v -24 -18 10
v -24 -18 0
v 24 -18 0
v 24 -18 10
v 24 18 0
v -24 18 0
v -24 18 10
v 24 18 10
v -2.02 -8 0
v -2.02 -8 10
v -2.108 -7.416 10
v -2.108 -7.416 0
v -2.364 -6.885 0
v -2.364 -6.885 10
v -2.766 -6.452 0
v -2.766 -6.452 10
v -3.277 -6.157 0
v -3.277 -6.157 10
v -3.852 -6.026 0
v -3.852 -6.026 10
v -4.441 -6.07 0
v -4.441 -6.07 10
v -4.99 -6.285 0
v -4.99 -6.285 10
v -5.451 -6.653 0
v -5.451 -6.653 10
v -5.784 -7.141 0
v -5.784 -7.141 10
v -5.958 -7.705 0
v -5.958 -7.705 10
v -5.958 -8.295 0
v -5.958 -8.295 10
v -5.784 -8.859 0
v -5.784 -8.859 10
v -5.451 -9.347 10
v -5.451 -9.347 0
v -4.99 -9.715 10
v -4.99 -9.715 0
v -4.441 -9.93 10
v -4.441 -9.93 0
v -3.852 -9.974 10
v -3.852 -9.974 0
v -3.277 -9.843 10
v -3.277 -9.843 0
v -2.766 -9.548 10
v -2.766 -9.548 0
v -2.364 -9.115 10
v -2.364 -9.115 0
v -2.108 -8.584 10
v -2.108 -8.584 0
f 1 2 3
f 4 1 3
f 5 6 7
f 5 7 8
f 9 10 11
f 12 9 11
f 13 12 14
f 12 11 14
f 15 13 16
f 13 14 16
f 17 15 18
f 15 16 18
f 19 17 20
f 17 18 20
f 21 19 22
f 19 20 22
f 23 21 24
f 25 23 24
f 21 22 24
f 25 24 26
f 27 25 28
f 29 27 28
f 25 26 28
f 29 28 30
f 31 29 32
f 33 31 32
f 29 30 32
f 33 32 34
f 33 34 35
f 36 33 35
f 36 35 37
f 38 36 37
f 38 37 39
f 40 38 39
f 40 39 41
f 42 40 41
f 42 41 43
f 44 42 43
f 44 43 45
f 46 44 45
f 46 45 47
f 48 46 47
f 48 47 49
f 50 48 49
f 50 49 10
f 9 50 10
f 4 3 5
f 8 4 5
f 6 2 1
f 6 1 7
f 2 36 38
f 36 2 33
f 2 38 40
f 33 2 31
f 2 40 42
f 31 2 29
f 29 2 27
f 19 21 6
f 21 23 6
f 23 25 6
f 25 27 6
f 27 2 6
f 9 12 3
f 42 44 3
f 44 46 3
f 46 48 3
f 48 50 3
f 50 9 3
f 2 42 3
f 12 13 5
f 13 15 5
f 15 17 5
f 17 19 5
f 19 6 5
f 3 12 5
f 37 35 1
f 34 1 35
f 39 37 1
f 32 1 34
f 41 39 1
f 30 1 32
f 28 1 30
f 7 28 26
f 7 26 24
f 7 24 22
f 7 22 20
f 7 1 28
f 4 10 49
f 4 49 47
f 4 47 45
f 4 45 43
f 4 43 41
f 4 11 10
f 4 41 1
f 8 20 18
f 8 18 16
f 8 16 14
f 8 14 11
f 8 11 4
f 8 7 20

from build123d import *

# Parameters (mm, degrees)
IZIM1_W                     = 48
IZIM1_H                     = 36
IZIM1_W_2                   = 2.8
IZIM1_H_2                   = 2.8
Y_KSEKLIK_EKSTR_ZYON1_DEPTH = 10
IZIM2_R                     = 1.979898987
KES_EKSTR_ZYON2_DEPTH       = 10


with BuildPart() as part:
    # Çizim1 → Yükseklik-Ekstrüzyon1 (new body)
    with BuildSketch(Plane.XY):
        Rectangle(IZIM1_W, IZIM1_H)
        with Locations((-4, -8)):
            Rectangle(IZIM1_W_2, IZIM1_H_2, mode=Mode.SUBTRACT)
    extrude(amount=Y_KSEKLIK_EKSTR_ZYON1_DEPTH)

    # Çizim2 → Kes-Ekstrüzyon2 (cut)
    with BuildSketch(Plane.XY.offset(10)):
        with Locations((-4, -8)):
            Circle(IZIM2_R)
    extrude(amount=-KES_EKSTR_ZYON2_DEPTH, mode=Mode.SUBTRACT)


solid = part.part
